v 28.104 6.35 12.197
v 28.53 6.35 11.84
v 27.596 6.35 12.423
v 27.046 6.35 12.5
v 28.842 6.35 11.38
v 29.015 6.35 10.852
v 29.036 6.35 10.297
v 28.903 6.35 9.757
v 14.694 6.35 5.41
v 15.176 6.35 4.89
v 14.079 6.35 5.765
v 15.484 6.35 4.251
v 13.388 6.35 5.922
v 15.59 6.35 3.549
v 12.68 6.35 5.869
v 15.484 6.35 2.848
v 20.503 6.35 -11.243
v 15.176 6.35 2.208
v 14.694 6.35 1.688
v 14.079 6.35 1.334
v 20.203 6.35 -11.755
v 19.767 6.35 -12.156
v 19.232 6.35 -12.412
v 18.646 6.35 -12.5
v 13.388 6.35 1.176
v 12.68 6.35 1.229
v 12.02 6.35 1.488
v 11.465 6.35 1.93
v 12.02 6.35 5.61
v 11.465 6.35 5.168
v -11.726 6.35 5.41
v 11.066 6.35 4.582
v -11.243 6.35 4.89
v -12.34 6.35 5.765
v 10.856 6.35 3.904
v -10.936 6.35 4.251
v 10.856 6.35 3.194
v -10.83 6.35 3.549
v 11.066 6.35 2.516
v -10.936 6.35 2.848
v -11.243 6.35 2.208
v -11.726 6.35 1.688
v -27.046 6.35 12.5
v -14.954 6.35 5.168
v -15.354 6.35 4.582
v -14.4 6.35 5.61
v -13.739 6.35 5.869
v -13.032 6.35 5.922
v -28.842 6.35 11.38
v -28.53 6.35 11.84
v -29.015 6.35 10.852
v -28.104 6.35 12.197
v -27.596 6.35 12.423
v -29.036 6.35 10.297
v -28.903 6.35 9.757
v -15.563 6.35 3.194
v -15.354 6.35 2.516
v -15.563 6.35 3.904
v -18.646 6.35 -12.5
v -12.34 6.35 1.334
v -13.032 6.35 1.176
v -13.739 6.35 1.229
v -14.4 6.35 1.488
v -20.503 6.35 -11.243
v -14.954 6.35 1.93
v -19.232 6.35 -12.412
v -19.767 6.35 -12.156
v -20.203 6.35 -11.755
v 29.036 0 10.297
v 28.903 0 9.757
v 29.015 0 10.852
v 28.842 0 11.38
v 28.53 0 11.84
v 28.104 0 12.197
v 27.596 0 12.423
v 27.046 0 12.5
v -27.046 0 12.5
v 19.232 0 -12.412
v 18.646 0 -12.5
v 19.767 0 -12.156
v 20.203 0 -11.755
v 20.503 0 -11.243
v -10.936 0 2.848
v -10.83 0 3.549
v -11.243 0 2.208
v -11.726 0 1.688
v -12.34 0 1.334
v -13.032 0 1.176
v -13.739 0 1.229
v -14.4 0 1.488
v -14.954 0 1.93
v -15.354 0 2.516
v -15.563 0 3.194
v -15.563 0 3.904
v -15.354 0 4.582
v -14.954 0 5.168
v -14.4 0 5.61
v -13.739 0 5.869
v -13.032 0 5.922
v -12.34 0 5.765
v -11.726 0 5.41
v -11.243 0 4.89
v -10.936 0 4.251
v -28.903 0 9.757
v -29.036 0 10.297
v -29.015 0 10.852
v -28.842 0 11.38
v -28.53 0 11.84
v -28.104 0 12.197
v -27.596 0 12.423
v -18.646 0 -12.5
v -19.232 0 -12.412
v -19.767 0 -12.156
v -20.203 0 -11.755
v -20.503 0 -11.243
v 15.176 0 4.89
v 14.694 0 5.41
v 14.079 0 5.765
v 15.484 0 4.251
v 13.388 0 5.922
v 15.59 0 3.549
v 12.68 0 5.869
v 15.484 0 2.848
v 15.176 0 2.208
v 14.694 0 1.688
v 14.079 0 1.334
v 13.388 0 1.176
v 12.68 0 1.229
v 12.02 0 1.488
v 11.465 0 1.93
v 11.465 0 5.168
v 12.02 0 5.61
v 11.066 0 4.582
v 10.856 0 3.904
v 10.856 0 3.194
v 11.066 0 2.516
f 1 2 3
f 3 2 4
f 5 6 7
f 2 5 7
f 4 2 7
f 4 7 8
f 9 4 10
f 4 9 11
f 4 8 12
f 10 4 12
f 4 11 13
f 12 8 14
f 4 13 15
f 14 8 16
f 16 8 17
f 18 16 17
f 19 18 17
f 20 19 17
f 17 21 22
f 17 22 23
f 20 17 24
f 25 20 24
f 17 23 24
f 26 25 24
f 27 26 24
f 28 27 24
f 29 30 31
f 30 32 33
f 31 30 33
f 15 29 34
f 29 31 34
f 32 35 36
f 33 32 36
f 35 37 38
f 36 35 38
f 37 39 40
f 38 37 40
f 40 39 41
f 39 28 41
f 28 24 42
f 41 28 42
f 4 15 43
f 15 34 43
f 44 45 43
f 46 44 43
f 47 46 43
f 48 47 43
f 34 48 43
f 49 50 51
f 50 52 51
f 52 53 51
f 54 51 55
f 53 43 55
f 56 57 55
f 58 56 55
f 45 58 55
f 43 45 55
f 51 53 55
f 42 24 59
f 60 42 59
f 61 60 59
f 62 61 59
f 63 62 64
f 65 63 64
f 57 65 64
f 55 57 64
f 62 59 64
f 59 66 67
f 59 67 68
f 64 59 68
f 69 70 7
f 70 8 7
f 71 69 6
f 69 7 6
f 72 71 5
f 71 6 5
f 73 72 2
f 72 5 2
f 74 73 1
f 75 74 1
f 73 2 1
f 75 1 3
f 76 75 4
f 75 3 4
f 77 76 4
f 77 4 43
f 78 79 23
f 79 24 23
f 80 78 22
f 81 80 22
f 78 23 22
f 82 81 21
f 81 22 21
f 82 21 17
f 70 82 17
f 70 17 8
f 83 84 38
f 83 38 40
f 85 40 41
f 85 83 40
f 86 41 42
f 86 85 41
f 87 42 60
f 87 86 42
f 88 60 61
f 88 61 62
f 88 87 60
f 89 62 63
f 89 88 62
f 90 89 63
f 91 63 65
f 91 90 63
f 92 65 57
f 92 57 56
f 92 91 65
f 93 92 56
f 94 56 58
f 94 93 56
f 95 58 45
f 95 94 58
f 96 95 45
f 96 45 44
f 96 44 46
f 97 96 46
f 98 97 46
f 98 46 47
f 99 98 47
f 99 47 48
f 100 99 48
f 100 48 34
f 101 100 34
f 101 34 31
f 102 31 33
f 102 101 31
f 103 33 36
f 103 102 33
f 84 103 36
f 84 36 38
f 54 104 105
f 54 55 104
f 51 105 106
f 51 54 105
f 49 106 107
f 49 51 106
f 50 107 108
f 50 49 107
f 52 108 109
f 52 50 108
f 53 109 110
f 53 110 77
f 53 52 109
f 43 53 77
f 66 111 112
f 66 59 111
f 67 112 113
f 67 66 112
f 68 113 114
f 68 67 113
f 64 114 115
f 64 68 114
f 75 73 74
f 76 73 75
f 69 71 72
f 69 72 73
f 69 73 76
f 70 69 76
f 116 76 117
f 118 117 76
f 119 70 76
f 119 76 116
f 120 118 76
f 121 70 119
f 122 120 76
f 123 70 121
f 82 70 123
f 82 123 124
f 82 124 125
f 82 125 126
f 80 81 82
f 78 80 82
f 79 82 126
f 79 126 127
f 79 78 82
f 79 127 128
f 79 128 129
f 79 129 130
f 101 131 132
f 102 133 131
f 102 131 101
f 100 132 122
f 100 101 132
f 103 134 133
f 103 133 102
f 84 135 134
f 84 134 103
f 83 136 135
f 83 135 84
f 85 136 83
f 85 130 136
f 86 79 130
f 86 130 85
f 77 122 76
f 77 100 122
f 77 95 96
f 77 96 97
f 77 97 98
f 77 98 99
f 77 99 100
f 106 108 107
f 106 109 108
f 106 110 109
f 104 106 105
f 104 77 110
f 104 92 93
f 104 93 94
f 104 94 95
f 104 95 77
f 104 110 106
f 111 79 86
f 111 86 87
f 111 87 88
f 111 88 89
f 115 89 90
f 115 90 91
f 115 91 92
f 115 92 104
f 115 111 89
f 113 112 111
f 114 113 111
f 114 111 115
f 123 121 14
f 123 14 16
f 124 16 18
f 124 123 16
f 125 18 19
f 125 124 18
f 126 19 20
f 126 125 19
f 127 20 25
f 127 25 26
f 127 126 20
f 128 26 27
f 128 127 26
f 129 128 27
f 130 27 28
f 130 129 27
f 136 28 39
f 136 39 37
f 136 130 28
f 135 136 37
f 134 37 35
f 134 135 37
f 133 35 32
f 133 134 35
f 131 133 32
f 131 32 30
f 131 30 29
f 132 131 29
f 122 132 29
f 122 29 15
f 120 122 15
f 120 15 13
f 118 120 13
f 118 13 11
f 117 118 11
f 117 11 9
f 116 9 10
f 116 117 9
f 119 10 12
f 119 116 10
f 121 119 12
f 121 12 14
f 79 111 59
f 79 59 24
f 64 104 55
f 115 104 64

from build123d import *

# Parameters (mm, degrees)
SKETCH1_R           = 2.38
BOSS_EXTRUDE1_DEPTH = 6.35
FILLET1_R           = 2


with BuildPart() as part:
    # Sketch1 → Boss-Extrude1 (new body)
    with BuildSketch(Plane(origin=(0, 0, 0), x_dir=(1, 0, 0), z_dir=(0, 1, 0))):
        Polygon((-20, 12.5), (20, 12.5), (30, -12.5), (-30, -12.5), align=None)
        with Locations((-13.209810235, -3.549051176)):
            Circle(SKETCH1_R, mode=Mode.SUBTRACT)
        with Locations((13.209810235, -3.549051176)):
            Circle(SKETCH1_R, mode=Mode.SUBTRACT)
    extrude(amount=BOSS_EXTRUDE1_DEPTH)

    # Fillet1
    fillet1_edges = [part.edges().sort_by_distance(p)[0] for p in [
        (-20, 3.175, -12.5),
        (20, 3.175, -12.5),
        (30, 3.175, 12.5),
        (-30, 3.175, 12.5),
    ]]
    fillet(fillet1_edges, radius=FILLET1_R)


solid = part.part
